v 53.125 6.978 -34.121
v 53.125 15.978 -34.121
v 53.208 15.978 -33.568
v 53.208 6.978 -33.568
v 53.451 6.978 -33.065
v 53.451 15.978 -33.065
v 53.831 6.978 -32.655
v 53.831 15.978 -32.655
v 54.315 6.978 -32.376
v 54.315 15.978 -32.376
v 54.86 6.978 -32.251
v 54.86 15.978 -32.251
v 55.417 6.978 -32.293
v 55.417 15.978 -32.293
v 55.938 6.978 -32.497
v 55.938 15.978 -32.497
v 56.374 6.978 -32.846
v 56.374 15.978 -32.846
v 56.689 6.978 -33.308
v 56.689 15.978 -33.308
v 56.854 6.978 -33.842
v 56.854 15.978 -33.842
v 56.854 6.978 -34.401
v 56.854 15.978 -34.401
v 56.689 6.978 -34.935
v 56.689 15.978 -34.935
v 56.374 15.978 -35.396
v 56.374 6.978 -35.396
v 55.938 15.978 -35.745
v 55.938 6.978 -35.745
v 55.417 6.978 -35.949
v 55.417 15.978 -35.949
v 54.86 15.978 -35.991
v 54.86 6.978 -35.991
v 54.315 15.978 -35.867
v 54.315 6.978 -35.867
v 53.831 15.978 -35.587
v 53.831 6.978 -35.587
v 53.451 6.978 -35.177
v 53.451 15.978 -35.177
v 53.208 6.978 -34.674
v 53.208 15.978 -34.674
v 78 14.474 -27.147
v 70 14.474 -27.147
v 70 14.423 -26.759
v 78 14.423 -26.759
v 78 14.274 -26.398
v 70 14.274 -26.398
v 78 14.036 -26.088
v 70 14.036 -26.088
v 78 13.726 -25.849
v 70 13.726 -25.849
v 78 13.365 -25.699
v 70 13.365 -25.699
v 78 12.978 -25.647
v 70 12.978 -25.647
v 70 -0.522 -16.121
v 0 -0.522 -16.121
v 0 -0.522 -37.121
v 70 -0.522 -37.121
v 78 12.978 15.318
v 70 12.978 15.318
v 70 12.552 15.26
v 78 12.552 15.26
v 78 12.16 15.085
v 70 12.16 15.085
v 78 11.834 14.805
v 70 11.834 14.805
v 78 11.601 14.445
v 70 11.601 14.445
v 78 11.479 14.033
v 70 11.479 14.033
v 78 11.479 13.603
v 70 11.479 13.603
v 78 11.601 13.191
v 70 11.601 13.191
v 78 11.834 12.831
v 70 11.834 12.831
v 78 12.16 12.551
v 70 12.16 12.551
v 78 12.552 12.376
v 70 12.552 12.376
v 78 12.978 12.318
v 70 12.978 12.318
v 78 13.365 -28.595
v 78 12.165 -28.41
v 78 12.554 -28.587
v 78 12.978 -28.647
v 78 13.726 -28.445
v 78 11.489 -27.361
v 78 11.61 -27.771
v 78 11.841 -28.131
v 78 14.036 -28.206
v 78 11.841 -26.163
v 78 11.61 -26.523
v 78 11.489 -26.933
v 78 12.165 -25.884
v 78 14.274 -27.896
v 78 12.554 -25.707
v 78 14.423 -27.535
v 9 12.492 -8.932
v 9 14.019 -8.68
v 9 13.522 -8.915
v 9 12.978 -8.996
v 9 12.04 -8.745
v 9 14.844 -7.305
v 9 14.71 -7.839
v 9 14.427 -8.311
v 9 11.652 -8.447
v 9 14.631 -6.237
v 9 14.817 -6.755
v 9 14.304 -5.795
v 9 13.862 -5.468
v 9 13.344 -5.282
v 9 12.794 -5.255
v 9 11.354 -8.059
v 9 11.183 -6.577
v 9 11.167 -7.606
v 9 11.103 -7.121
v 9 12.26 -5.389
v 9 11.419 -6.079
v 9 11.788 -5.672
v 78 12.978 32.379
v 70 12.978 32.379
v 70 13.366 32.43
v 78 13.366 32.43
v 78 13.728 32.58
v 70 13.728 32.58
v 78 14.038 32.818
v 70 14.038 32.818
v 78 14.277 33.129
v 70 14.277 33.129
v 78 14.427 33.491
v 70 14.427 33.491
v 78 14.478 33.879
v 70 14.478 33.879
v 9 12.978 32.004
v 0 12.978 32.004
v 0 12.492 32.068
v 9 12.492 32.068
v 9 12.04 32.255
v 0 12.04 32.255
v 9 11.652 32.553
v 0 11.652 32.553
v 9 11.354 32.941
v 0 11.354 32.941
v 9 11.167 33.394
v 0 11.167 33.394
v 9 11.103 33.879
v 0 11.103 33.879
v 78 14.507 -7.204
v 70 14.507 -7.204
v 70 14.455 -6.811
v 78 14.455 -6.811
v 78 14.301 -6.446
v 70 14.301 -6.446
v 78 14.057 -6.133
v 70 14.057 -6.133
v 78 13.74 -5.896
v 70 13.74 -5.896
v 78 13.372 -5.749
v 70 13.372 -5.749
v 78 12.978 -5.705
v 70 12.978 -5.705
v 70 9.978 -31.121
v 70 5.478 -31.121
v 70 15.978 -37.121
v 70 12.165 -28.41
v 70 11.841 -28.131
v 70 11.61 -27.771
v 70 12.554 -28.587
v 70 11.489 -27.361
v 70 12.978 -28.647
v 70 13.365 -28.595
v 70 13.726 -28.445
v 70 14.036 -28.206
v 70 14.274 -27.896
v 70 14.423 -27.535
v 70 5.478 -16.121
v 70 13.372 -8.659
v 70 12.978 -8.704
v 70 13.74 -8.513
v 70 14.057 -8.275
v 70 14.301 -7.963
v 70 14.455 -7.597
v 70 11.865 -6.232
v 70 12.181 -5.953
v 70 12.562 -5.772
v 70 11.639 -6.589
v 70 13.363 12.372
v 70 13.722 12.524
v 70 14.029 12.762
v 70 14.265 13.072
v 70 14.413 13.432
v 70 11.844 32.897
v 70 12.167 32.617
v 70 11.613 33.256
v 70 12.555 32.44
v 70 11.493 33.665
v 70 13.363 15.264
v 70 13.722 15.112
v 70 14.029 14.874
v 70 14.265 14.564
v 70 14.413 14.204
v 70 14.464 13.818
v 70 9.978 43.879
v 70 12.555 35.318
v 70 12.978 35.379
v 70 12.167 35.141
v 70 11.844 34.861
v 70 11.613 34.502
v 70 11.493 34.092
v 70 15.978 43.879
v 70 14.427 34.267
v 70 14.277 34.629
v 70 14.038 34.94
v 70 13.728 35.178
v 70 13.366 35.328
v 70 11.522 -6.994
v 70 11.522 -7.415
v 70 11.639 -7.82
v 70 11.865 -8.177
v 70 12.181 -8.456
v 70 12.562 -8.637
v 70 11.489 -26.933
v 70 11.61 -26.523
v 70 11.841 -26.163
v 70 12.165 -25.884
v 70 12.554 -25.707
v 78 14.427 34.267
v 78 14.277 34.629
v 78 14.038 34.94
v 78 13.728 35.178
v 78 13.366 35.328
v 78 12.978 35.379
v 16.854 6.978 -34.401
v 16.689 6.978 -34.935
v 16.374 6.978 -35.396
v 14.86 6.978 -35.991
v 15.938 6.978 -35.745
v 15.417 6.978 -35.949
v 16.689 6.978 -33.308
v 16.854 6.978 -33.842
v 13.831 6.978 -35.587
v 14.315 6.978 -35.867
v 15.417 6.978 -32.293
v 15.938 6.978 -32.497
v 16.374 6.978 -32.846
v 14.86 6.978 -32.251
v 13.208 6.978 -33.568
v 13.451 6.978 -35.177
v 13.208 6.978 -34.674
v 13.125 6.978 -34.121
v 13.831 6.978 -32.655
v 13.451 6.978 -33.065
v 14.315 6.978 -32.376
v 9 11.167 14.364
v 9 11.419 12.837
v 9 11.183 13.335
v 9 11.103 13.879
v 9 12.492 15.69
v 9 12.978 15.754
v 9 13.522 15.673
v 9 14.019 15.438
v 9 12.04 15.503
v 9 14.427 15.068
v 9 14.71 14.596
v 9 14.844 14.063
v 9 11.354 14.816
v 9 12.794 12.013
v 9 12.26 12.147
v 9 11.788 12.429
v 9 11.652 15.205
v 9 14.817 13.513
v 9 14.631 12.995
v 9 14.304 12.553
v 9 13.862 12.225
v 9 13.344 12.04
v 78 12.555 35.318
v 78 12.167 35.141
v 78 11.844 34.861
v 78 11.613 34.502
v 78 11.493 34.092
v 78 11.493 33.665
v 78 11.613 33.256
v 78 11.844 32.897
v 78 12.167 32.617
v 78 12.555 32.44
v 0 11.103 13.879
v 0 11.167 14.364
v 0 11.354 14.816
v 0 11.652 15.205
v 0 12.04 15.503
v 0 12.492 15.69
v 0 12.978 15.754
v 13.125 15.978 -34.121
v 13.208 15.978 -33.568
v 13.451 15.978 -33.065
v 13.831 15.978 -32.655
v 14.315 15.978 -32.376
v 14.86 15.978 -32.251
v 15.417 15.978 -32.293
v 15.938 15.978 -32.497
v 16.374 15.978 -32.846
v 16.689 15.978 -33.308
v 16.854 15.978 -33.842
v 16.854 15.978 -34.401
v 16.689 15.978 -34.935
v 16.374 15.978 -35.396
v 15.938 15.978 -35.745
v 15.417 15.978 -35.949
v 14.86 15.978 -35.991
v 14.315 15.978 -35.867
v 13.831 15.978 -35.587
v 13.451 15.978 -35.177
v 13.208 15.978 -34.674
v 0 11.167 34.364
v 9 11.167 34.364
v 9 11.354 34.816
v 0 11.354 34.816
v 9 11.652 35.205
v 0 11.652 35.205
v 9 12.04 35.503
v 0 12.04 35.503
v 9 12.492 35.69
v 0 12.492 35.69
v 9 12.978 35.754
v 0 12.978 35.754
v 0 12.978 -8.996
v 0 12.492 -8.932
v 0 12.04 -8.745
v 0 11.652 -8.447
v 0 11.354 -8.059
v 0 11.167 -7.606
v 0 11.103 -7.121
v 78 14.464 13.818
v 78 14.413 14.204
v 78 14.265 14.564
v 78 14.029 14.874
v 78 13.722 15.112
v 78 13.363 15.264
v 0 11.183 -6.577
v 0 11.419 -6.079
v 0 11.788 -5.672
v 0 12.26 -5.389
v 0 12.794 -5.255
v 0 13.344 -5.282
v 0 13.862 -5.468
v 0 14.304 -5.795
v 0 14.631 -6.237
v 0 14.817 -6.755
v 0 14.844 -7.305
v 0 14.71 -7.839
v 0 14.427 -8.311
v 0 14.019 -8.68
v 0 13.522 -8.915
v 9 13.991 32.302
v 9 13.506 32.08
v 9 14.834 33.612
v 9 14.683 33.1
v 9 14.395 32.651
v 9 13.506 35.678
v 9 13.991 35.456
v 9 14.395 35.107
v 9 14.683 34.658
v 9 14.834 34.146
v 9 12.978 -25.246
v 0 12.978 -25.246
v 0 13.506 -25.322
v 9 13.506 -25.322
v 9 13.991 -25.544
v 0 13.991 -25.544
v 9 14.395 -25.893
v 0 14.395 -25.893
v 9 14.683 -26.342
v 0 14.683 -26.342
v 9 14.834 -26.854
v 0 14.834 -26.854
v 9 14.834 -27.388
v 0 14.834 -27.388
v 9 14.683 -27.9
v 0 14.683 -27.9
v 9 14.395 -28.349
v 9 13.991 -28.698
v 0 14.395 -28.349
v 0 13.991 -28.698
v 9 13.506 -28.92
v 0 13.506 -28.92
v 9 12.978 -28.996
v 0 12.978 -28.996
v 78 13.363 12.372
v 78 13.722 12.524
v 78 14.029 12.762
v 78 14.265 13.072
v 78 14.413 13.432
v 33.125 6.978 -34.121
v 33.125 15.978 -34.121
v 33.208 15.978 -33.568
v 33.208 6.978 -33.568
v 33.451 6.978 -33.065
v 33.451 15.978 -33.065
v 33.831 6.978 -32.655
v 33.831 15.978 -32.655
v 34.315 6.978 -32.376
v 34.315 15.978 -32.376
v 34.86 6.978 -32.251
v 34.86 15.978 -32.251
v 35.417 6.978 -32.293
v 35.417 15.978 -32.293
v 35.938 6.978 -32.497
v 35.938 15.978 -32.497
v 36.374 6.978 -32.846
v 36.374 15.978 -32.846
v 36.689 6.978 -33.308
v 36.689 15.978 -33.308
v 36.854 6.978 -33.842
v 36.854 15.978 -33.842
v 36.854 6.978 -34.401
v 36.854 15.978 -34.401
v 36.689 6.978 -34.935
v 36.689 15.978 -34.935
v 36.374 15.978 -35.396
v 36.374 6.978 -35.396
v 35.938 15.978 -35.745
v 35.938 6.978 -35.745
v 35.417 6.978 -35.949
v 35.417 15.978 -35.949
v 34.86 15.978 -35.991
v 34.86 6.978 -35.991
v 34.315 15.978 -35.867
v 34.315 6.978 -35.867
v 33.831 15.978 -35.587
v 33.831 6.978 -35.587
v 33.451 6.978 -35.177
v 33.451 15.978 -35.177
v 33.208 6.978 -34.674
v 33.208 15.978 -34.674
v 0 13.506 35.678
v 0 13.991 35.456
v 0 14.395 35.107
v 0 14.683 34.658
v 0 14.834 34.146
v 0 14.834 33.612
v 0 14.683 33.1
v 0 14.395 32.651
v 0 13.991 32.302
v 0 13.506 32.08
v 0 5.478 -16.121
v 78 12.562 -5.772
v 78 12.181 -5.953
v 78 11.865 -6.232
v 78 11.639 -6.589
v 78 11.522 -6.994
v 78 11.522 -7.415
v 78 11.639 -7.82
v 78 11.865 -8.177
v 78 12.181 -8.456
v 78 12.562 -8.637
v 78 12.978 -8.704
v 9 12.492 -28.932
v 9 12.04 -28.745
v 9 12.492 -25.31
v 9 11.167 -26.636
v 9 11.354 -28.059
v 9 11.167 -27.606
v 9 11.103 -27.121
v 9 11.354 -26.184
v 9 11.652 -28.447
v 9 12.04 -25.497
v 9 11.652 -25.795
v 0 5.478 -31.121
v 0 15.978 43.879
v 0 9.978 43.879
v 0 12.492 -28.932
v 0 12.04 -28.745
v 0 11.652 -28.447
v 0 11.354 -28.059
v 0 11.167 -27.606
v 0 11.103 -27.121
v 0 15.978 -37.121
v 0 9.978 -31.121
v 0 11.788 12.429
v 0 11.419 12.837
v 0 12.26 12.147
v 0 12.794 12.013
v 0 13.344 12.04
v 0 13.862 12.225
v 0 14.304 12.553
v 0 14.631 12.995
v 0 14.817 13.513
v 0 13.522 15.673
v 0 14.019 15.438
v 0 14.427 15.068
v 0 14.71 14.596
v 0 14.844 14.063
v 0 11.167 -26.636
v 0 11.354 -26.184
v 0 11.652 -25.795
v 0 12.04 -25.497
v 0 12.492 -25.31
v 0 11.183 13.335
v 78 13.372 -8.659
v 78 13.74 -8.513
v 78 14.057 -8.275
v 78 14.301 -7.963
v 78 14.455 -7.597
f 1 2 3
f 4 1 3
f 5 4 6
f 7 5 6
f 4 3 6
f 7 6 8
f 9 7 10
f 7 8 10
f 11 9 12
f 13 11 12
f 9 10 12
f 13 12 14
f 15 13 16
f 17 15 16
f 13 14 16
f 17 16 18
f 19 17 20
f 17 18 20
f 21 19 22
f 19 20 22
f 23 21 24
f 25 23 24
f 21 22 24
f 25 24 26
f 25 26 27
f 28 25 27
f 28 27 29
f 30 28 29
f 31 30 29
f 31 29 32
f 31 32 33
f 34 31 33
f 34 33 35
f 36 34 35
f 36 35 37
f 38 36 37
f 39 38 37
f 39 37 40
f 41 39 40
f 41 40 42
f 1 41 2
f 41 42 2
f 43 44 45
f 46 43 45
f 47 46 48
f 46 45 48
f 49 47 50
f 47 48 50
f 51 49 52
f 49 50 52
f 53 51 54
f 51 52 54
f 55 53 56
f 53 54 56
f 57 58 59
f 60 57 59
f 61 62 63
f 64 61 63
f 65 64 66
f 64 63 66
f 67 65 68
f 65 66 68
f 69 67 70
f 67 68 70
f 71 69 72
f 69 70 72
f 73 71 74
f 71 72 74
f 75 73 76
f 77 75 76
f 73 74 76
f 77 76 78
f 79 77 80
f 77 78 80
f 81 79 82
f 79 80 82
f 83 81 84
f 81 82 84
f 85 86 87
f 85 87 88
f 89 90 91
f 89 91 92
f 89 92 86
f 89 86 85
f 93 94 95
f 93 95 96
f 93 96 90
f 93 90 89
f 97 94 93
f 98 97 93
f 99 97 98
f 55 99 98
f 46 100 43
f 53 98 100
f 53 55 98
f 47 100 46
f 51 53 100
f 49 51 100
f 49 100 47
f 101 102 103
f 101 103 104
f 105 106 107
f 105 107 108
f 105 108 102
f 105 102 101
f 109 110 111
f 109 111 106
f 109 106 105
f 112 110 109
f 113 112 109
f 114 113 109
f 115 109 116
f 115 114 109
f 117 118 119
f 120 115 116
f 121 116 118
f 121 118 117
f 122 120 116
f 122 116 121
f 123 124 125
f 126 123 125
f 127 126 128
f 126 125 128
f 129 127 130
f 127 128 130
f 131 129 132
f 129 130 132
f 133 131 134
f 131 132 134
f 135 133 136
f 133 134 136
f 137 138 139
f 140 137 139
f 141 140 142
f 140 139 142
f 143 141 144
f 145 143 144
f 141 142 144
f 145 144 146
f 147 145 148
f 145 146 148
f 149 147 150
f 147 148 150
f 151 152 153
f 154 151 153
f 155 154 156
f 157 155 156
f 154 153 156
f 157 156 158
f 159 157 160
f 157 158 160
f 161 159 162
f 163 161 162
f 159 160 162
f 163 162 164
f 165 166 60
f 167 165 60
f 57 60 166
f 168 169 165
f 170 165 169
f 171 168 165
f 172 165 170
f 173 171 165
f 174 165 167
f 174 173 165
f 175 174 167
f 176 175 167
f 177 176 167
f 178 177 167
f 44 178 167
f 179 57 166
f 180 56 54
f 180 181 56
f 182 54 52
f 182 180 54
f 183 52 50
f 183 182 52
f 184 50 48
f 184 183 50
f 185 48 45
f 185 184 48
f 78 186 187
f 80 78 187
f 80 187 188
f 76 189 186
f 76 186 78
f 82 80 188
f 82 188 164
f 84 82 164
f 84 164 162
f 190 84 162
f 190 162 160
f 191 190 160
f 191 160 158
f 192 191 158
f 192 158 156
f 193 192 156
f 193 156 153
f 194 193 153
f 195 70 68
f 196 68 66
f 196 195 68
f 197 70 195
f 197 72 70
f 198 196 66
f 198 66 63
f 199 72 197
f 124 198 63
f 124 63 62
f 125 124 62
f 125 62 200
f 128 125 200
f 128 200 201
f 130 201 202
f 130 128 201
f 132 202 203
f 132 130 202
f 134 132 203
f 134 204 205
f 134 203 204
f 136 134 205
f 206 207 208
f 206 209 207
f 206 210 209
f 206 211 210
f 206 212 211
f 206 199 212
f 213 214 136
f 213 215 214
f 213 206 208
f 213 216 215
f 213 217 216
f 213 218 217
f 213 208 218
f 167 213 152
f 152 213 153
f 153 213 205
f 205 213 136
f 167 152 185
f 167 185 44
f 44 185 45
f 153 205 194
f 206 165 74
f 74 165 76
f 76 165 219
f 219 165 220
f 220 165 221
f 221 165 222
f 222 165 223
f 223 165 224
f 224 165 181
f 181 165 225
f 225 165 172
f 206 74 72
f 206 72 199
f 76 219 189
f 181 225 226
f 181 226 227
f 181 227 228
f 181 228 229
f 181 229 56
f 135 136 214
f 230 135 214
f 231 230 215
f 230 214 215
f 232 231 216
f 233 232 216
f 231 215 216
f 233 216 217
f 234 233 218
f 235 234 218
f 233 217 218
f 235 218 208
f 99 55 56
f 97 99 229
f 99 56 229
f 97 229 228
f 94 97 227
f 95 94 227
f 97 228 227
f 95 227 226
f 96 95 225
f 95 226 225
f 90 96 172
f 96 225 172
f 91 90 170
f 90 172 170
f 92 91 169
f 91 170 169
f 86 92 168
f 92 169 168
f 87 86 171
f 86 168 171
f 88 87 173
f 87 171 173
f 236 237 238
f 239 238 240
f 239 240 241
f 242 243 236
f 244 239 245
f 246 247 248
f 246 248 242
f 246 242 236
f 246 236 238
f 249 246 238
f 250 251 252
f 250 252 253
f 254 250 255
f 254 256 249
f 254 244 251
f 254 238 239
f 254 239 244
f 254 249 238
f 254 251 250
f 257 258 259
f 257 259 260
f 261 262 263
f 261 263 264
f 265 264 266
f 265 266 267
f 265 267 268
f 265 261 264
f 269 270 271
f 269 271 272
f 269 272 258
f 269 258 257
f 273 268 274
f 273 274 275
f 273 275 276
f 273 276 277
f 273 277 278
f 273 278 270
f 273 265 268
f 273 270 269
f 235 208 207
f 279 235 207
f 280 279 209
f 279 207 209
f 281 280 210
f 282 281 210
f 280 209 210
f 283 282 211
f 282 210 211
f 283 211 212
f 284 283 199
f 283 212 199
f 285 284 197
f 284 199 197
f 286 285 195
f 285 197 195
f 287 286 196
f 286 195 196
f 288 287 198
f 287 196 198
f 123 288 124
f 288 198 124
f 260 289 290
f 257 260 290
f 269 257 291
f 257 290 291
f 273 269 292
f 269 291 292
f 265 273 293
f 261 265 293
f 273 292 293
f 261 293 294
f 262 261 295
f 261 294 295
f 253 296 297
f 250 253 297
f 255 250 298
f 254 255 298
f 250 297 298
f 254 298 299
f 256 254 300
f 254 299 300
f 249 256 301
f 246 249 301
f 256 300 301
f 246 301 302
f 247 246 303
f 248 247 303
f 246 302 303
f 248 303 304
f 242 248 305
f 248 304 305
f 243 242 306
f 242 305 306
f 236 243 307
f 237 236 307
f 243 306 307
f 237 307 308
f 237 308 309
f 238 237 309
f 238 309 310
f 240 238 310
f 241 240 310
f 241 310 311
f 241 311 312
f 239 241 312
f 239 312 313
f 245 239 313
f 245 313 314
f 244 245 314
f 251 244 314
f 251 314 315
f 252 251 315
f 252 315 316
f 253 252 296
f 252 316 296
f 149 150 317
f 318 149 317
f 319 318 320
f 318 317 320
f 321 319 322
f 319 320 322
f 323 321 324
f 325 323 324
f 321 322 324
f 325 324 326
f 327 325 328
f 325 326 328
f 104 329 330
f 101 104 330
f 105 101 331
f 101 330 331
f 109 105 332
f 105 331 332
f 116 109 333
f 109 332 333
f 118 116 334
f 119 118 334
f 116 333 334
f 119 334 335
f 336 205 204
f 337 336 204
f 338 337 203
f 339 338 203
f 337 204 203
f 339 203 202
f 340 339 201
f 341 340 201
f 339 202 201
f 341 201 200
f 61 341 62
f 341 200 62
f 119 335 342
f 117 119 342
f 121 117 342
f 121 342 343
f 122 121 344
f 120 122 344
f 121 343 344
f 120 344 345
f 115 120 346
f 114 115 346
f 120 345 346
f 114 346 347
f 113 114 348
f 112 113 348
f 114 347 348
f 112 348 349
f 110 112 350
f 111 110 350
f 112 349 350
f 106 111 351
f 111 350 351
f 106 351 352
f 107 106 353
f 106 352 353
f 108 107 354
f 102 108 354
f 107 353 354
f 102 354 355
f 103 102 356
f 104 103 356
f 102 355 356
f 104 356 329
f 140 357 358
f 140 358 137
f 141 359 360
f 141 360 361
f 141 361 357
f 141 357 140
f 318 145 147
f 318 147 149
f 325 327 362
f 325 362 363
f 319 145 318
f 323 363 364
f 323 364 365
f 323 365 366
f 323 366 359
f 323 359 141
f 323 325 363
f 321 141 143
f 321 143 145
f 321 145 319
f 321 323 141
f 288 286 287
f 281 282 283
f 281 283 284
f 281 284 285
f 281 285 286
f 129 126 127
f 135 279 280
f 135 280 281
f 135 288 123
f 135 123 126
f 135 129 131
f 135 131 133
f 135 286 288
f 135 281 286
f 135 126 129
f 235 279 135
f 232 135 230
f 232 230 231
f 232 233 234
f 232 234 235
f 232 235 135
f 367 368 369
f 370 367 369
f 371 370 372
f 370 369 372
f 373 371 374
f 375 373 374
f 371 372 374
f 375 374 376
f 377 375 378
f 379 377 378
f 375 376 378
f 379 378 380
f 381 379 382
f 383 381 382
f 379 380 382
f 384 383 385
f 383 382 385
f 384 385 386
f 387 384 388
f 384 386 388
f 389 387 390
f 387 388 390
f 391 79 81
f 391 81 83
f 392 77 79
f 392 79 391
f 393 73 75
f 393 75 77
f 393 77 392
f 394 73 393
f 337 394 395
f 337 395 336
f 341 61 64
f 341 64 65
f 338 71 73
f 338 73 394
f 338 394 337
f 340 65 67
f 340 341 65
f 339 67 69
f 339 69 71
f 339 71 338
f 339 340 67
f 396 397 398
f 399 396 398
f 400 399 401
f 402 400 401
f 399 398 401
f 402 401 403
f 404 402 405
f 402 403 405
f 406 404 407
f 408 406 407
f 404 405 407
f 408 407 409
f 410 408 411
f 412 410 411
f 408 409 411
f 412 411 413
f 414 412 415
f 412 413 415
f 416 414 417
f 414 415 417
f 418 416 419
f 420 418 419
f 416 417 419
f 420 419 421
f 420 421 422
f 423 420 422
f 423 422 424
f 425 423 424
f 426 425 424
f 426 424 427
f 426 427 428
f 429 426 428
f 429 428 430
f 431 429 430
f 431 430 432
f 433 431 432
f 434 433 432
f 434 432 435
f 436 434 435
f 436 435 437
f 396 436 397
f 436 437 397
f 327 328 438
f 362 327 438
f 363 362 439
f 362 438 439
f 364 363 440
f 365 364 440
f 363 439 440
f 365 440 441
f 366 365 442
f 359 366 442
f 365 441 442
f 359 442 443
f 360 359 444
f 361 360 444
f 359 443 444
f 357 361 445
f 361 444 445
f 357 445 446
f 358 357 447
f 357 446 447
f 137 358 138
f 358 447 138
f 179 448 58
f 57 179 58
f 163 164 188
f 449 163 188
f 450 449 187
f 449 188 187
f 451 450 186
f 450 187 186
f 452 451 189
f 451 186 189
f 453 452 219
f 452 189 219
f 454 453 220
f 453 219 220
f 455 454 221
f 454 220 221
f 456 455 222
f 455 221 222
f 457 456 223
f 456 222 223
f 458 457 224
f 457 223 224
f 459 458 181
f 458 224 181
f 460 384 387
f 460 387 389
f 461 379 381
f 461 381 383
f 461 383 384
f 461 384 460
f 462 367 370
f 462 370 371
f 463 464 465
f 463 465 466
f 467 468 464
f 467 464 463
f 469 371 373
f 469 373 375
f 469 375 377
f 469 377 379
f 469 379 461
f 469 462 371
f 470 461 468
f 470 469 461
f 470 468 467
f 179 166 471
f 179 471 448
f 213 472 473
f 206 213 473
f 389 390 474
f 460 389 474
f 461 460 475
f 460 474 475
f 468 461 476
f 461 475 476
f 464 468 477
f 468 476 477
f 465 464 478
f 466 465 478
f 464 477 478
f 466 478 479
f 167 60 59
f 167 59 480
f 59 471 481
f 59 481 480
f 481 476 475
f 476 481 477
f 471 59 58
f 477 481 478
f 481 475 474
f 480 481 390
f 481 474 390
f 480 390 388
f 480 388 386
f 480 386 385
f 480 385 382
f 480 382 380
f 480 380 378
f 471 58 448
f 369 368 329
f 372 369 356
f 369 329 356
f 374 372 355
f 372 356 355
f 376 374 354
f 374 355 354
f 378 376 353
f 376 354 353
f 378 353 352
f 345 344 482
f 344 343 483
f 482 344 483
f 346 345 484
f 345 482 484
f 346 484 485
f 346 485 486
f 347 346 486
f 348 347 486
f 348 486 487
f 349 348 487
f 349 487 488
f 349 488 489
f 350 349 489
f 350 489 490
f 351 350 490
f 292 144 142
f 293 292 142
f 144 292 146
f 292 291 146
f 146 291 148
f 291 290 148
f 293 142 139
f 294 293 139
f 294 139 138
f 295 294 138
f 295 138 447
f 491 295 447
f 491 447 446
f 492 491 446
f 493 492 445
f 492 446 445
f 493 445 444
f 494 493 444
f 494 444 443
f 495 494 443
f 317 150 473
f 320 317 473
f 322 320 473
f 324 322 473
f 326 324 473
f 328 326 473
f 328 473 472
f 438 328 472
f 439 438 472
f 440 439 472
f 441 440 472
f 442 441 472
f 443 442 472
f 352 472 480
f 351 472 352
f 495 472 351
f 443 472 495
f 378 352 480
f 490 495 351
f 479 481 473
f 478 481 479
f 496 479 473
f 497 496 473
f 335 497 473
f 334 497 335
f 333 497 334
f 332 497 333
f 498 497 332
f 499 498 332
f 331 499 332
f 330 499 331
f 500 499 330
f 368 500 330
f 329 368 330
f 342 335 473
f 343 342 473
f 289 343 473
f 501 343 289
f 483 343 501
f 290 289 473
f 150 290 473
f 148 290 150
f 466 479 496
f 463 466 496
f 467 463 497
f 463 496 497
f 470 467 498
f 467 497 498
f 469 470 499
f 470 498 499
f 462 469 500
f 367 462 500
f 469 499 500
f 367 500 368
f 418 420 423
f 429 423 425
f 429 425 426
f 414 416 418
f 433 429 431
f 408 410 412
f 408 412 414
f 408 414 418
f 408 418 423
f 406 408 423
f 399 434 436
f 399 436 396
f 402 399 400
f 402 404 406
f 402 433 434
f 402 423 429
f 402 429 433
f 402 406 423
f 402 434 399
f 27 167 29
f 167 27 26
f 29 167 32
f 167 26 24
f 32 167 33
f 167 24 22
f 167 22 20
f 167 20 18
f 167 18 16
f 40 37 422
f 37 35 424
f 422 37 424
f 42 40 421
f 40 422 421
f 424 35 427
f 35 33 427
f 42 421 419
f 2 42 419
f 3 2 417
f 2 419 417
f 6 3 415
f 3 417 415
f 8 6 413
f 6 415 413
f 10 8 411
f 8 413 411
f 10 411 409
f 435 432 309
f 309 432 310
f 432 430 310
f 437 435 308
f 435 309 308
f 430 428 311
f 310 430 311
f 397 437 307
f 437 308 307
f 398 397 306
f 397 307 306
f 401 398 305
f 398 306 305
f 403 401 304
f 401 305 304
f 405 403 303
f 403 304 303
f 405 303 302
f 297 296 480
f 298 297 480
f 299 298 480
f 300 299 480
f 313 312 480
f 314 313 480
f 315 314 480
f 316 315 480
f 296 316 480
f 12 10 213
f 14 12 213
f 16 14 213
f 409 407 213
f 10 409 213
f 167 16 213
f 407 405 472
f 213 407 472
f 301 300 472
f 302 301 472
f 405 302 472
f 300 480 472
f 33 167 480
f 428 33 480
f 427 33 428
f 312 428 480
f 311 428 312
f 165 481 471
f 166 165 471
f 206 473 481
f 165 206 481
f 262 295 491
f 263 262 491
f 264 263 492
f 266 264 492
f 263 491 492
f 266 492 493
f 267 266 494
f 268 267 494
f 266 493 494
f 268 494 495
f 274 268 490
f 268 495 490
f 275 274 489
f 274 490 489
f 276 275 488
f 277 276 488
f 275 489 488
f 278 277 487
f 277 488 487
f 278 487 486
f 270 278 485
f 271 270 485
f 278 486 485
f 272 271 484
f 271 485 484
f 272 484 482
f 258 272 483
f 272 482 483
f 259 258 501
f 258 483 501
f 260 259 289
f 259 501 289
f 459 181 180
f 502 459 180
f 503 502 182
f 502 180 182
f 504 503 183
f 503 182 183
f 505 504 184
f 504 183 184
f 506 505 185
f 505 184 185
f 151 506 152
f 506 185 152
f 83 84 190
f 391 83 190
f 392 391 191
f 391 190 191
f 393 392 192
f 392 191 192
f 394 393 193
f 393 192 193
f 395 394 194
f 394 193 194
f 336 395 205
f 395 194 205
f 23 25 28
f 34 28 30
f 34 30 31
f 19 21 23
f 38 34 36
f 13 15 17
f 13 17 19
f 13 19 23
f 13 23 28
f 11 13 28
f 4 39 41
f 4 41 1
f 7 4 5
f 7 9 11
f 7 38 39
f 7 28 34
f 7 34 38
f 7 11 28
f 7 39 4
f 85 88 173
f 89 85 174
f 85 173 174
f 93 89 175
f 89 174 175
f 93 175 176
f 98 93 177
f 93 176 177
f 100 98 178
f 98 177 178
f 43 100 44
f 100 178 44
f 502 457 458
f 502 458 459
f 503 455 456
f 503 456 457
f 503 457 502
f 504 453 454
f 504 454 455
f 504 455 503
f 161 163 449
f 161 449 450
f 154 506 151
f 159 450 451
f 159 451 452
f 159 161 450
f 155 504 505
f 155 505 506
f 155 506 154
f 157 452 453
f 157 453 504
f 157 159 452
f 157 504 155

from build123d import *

# Parameters (mm, degrees)
F1_DEPTH = 70
F3_DEPTH = 8
F5_DEPTH = 9
F6_R     = 1.875
F7_DEPTH = 9


# Not quite as in the source:
# - a feature names something its author has since deleted; it is built from what else it names


with BuildPart() as f1:
    # F0 (on Right) → F1 (new body)
    with BuildSketch(Plane.YZ):
        Polygon((15.9777059274, -37.1211464703), (15.9777059274, 43.8788535297), (9.9777059274, 43.8788535297), (9.9777059274, -31.1211464703), (5.4777059274, -31.1211464703), (5.4777059274, -16.1211464703), (-0.5222940726, -16.1211464703), (-0.5222940726, -37.1211464703), align=None)
    extrude(amount=F1_DEPTH)

    # F2 (on face) → F3 (join)
    with BuildSketch(Plane.YZ.offset(70)):
        with BuildLine():
            Line((12.9777059274, 33.8788535297), (12.9777059274, 35.3788535297))
            ThreePointArc((12.9777059274, 35.3788535297), (11.4777059274, 33.8788535297), (12.9777059274, 32.3788535297))
            Line((12.9777059274, 32.3788535297), (12.9777059274, 33.8788535297))
        make_face()
        with BuildLine():
            ThreePointArc((12.9777059274, 32.3788535297), (14.0383660992, 32.8181933579), (14.4777059274, 33.8788535297))
            ThreePointArc((14.4777059274, 33.8788535297), (14.0383660992, 34.9395137015), (12.9777059274, 35.3788535297))
            Line((12.9777059274, 35.3788535297), (12.9777059274, 33.8788535297))
            Line((12.9777059274, 33.8788535297), (12.9777059274, 32.3788535297))
        make_face()
        with BuildLine():
            Line((12.9777059274, 13.8788535297), (12.9777059274, 15.3178830066))
            ThreePointArc((12.9777059274, 15.3178830066), (11.4636811456, 13.8179485729), (12.9777059274, 12.3180141391))
            Line((12.9777059274, 12.3180141391), (12.9777059274, 13.8788535297))
        make_face()
        with BuildLine():
            ThreePointArc((14.4636811456, 13.8179485729), (14.0292882901, 14.8736385906), (12.9777059274, 15.3178830066))
            Line((12.9777059274, 15.3178830066), (12.9777059274, 13.8788535297))
            Line((12.9777059274, 13.8788535297), (12.9777059274, 12.3180141391))
            ThreePointArc((12.9777059274, 12.3180141391), (14.0292882901, 12.7622585551), (14.4636811456, 13.8179485729))
        make_face()
        with BuildLine():
            Line((12.9777059274, -7.1211464703), (12.9777059274, -5.7047228841))
            ThreePointArc((12.9777059274, -5.7047228841), (11.5072213267, -7.2044324698), (12.9777059274, -8.7041420554))
            Line((12.9777059274, -8.7041420554), (12.9777059274, -7.1211464703))
        make_face()
        with BuildLine():
            ThreePointArc((14.5072213267, -7.2044324698), (14.0573943841, -6.1333878631), (12.9777059274, -5.7047228841))
            Line((12.9777059274, -5.7047228841), (12.9777059274, -7.1211464703))
            Line((12.9777059274, -7.1211464703), (12.9777059274, -8.7041420554))
            ThreePointArc((12.9777059274, -8.7041420554), (14.0573943841, -8.2754770764), (14.5072213267, -7.2044324698))
        make_face()
        with BuildLine():
            ThreePointArc((12.9777059274, -25.6469734003), (11.473965778, -27.1469687374), (12.9777059274, -28.6469640745))
            Line((12.9777059274, -28.6469640745), (12.9777059274, -27.1211464703))
            Line((12.9777059274, -27.1211464703), (12.9777059274, -25.6469734003))
        make_face()
        with BuildLine():
            Line((12.9777059274, -27.1211464703), (12.9777059274, -28.6469640745))
            ThreePointArc((12.9777059274, -28.6469640745), (14.035947469, -28.2063057413), (14.473965778, -27.1469687374))
            ThreePointArc((14.473965778, -27.1469687374), (14.035947469, -26.0876317334), (12.9777059274, -25.6469734003))
            Line((12.9777059274, -25.6469734003), (12.9777059274, -27.1211464703))
        make_face()
    extrude(amount=F3_DEPTH)

    # F4 (on face) → F5 (cut)
    with BuildSketch(Plane(origin=(0, 0, 0), x_dir=(0, -1, 0), z_dir=(-1, 0, 0))):
        with BuildLine():
            ThreePointArc((-12.9777059274, 32.0038535297), (-11.6518807127, 32.553028315), (-11.1027059274, 33.8788535297))
            ThreePointArc((-11.1027059274, 33.8788535297), (-11.6518807127, 35.2046787444), (-12.9777059274, 35.7538535297))
            Line((-12.9777059274, 35.7538535297), (-12.9777059274, 33.8788535297))
            Line((-12.9777059274, 33.8788535297), (-12.9777059274, 32.0038535297))
        make_face()
        with BuildLine():
            Line((-12.9777059274, 33.8788535297), (-12.9777059274, 35.7538535297))
            ThreePointArc((-12.9777059274, 35.7538535297), (-14.8527059274, 33.8788535297), (-12.9777059274, 32.0038535297))
            Line((-12.9777059274, 32.0038535297), (-12.9777059274, 33.8788535297))
        make_face()
        with BuildLine():
            ThreePointArc((-11.1027059274, 13.8788535297), (-11.6518807127, 15.2046787444), (-12.9777059274, 15.7538535297))
            ThreePointArc((-12.9777059274, 15.7538535297), (-14.3035311422, 12.553028315), (-11.1027059274, 13.8788535297))
        make_face()
        with BuildLine():
            ThreePointArc((-11.1027059274, -7.1211464703), (-14.3035311422, -5.7953212556), (-12.9777059274, -8.9961464703))
            ThreePointArc((-12.9777059274, -8.9961464703), (-11.6518807127, -8.446971685), (-11.1027059274, -7.1211464703))
        make_face()
        with BuildLine():
            ThreePointArc((-12.9777059274, -25.2461464703), (-14.8527059274, -27.1211464703), (-12.9777059274, -28.9961464703))
            Line((-12.9777059274, -28.9961464703), (-12.9777059274, -27.1211464703))
            Line((-12.9777059274, -27.1211464703), (-12.9777059274, -25.2461464703))
        make_face()
        with BuildLine():
            Line((-12.9777059274, -27.1211464703), (-12.9777059274, -28.9961464703))
            ThreePointArc((-12.9777059274, -28.9961464703), (-11.6518807127, -28.446971685), (-11.1027059274, -27.1211464703))
            ThreePointArc((-11.1027059274, -27.1211464703), (-11.6518807127, -25.7953212556), (-12.9777059274, -25.2461464703))
            Line((-12.9777059274, -25.2461464703), (-12.9777059274, -27.1211464703))
        make_face()
    extrude(amount=-F5_DEPTH, mode=Mode.SUBTRACT)

    # F6 (on face) → F7 (cut)
    with BuildSketch(Plane(origin=(0, 15.9777059274, 0), x_dir=(-1, 0, 0), z_dir=(0, 1, 0))):
        with Locations((-55, -34.1211464703)):
            Circle(F6_R)
        with Locations((-35, -34.1211464703)):
            Circle(F6_R)
        with Locations((-15, -34.1211464703)):
            Circle(F6_R)
    extrude(amount=-F7_DEPTH, mode=Mode.SUBTRACT)


solid = f1.part
